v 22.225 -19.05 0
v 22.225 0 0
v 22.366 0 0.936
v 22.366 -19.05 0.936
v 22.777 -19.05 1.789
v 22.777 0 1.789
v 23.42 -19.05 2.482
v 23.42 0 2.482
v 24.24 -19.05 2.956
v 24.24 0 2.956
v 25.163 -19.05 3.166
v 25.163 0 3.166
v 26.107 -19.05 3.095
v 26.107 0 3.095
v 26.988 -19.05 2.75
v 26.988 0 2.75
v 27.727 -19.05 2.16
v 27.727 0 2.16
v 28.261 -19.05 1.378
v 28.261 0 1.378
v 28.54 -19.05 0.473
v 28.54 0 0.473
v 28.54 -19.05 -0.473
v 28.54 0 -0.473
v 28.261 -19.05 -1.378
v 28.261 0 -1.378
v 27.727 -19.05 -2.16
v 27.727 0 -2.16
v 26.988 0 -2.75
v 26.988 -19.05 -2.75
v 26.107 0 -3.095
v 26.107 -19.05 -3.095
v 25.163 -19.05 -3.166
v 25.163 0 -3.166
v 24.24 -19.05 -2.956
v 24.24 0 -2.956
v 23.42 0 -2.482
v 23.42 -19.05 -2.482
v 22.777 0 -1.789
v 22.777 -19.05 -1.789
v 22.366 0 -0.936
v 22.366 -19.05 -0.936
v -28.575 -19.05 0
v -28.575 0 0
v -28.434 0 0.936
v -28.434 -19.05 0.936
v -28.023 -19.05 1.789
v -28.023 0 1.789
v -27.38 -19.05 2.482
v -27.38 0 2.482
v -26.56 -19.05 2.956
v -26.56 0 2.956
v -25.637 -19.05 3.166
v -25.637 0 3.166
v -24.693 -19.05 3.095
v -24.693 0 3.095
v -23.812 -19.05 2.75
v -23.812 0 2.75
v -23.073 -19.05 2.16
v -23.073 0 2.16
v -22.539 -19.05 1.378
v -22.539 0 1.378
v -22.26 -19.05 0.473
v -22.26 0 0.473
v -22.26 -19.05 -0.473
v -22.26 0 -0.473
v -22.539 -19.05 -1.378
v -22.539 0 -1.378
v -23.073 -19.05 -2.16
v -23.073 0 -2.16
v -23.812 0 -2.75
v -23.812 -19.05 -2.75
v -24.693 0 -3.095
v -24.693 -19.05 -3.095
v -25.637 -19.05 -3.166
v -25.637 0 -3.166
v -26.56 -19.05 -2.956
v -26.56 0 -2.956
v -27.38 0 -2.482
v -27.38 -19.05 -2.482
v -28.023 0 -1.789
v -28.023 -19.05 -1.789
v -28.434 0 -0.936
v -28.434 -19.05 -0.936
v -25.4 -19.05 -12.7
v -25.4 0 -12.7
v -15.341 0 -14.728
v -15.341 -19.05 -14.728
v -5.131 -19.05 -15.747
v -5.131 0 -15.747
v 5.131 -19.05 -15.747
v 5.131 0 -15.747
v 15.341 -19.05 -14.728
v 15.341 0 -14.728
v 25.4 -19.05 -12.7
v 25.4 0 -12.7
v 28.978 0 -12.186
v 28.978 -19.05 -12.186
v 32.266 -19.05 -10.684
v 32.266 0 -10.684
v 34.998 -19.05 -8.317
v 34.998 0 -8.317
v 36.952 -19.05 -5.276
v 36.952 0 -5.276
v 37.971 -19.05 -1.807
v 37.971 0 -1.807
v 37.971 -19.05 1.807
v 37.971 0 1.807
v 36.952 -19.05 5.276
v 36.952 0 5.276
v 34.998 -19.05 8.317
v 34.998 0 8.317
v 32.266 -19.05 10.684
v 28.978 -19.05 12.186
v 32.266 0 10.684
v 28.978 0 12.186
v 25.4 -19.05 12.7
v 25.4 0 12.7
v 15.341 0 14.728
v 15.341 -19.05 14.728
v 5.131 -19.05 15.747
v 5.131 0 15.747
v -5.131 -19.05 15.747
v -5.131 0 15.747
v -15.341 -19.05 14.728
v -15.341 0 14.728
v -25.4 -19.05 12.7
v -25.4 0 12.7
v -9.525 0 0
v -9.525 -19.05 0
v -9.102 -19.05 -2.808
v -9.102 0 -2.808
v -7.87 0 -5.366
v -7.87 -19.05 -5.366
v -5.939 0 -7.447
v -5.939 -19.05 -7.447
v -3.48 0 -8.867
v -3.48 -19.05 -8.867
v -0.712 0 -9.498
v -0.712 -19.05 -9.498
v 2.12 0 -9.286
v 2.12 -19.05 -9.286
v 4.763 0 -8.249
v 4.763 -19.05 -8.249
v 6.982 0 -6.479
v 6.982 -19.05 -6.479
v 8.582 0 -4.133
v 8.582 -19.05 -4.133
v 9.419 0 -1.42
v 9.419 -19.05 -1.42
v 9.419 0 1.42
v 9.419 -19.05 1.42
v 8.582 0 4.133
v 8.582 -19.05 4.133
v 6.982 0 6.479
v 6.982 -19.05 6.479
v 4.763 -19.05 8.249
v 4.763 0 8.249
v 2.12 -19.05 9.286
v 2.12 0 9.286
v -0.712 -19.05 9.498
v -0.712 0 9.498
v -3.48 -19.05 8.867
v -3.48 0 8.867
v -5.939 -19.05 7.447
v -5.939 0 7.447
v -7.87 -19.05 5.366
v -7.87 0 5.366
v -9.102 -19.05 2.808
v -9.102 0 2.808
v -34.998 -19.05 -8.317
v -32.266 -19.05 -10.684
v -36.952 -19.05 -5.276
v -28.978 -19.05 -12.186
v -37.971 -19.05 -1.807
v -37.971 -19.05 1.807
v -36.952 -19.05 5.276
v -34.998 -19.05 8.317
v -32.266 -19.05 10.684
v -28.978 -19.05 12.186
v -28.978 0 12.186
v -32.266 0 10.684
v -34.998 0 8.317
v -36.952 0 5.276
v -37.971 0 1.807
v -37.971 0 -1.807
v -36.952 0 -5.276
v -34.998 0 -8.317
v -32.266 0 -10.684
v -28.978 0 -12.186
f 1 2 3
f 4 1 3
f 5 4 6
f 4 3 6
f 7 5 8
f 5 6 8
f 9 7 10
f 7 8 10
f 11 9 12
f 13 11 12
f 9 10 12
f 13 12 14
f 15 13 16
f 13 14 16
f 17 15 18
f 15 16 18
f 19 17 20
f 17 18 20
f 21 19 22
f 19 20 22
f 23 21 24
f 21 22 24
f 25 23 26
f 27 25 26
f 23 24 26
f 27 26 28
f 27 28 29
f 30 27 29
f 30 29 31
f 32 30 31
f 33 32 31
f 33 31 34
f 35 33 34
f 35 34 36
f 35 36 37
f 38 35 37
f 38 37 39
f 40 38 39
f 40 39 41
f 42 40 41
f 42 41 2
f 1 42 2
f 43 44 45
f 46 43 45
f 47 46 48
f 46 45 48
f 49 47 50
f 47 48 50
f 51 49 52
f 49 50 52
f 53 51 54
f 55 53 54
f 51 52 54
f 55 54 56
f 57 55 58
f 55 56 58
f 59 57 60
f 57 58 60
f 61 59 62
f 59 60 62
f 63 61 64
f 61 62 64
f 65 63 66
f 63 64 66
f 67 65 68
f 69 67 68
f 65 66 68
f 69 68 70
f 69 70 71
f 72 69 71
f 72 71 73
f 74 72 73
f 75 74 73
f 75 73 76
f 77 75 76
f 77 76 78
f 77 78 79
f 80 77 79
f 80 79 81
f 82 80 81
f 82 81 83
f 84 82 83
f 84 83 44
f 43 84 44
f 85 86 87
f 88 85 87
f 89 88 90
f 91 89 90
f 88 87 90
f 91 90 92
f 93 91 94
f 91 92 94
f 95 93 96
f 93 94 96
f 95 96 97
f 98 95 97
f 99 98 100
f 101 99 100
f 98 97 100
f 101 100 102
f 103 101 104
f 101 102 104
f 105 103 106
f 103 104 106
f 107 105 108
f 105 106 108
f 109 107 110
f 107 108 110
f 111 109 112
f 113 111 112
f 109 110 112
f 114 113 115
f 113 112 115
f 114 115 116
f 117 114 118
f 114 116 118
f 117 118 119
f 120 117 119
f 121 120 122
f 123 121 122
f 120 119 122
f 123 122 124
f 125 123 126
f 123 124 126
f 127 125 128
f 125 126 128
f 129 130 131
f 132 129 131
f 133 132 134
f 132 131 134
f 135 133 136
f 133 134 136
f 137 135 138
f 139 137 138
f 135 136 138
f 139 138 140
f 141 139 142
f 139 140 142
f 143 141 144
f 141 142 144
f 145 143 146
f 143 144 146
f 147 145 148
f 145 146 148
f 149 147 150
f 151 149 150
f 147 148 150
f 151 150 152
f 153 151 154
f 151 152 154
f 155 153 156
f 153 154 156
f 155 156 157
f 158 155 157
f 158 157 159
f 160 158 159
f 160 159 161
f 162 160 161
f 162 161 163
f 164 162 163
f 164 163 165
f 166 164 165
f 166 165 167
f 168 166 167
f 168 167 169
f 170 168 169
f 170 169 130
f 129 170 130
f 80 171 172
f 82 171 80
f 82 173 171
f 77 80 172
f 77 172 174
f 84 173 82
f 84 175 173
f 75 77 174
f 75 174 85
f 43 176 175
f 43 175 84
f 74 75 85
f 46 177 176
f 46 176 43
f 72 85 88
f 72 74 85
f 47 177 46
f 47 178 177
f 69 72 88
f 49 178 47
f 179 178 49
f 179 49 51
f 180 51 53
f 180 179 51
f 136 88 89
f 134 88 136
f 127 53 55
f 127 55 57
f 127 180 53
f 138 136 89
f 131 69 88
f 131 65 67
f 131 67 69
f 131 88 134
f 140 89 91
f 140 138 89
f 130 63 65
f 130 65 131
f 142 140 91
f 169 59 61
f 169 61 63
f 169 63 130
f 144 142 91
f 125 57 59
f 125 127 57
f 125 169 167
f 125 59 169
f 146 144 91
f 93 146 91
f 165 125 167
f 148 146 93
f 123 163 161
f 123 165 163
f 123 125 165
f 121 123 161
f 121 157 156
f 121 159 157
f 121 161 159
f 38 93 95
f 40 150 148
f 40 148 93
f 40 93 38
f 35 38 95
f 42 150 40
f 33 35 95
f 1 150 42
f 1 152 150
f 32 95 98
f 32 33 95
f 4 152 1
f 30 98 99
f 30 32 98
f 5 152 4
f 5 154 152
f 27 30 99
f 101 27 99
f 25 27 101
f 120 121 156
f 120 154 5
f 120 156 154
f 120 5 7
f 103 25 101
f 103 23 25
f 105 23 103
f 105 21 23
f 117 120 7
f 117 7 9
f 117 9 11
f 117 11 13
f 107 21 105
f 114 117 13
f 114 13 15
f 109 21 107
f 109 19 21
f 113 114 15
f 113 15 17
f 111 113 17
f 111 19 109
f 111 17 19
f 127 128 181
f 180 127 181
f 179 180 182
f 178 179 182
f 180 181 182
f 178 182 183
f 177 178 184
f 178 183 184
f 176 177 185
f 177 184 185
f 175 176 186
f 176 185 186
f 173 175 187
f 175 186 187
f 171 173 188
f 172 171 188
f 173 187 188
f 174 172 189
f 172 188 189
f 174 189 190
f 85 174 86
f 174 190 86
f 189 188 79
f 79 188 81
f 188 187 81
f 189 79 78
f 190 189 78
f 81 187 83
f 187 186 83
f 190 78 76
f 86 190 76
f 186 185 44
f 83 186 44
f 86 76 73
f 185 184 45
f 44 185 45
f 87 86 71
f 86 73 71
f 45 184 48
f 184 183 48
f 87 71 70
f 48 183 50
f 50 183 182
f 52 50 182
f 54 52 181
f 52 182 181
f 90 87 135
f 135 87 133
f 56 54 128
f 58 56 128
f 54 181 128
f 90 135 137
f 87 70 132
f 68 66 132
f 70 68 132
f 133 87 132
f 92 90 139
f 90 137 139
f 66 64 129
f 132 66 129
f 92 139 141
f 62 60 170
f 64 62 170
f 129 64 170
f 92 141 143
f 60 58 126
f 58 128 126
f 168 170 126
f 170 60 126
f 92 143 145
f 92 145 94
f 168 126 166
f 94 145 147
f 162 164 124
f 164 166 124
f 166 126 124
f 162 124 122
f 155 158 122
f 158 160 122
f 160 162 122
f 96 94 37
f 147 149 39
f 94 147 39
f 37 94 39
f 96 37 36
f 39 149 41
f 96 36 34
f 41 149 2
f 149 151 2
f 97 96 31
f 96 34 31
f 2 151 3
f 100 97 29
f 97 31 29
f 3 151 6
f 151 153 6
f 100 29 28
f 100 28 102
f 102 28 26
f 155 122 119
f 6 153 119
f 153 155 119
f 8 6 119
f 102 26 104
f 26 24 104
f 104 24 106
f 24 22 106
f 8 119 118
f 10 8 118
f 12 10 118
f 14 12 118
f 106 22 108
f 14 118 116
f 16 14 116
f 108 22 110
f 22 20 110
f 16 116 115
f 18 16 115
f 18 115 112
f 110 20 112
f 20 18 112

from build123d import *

# Parameters (mm, degrees)
F0_W     = 50.8
F0_H     = 25.4
F1_DEPTH = 19.05
F2_D     = 19.05
F4_D     = 6.35


with BuildPart() as f1:
    # F0 (on Front) → F1 (new body)
    with BuildSketch(Plane.XZ):
        Rectangle(F0_W, F0_H)
        with BuildLine():
            ThreePointArc((25.4, -12.7), (38.1, 0), (25.4, 12.7))
            Line((25.4, 12.7), (25.4, -12.7))
        make_face()
        with BuildLine():
            Line((-25.4, 12.7), (25.4, 12.7))
            ThreePointArc((25.4, 12.7), (0, 15.875), (-25.4, 12.7))
        make_face()
        with BuildLine():
            Line((-25.4, -12.7), (-25.4, 12.7))
            ThreePointArc((-25.4, 12.7), (-38.1, 0), (-25.4, -12.7))
        make_face()
        with BuildLine():
            ThreePointArc((-25.4, -12.7), (0, -15.875), (25.4, -12.7))
            Line((25.4, -12.7), (-25.4, -12.7))
        make_face()
    extrude(amount=F1_DEPTH)

    # F2 (through all)
    with Locations(Plane(origin=(0, 0, 0), x_dir=(1, 0, 0), z_dir=(0, 1, 0))):
        with Locations((0, 0)):
            Hole(F2_D / 2)

    # F4 (through all)
    with Locations(Plane.XZ.offset(19.05)):
        with Locations((-25.4, 0), (25.4, 0)):
            Hole(F4_D / 2)


solid = f1.part
